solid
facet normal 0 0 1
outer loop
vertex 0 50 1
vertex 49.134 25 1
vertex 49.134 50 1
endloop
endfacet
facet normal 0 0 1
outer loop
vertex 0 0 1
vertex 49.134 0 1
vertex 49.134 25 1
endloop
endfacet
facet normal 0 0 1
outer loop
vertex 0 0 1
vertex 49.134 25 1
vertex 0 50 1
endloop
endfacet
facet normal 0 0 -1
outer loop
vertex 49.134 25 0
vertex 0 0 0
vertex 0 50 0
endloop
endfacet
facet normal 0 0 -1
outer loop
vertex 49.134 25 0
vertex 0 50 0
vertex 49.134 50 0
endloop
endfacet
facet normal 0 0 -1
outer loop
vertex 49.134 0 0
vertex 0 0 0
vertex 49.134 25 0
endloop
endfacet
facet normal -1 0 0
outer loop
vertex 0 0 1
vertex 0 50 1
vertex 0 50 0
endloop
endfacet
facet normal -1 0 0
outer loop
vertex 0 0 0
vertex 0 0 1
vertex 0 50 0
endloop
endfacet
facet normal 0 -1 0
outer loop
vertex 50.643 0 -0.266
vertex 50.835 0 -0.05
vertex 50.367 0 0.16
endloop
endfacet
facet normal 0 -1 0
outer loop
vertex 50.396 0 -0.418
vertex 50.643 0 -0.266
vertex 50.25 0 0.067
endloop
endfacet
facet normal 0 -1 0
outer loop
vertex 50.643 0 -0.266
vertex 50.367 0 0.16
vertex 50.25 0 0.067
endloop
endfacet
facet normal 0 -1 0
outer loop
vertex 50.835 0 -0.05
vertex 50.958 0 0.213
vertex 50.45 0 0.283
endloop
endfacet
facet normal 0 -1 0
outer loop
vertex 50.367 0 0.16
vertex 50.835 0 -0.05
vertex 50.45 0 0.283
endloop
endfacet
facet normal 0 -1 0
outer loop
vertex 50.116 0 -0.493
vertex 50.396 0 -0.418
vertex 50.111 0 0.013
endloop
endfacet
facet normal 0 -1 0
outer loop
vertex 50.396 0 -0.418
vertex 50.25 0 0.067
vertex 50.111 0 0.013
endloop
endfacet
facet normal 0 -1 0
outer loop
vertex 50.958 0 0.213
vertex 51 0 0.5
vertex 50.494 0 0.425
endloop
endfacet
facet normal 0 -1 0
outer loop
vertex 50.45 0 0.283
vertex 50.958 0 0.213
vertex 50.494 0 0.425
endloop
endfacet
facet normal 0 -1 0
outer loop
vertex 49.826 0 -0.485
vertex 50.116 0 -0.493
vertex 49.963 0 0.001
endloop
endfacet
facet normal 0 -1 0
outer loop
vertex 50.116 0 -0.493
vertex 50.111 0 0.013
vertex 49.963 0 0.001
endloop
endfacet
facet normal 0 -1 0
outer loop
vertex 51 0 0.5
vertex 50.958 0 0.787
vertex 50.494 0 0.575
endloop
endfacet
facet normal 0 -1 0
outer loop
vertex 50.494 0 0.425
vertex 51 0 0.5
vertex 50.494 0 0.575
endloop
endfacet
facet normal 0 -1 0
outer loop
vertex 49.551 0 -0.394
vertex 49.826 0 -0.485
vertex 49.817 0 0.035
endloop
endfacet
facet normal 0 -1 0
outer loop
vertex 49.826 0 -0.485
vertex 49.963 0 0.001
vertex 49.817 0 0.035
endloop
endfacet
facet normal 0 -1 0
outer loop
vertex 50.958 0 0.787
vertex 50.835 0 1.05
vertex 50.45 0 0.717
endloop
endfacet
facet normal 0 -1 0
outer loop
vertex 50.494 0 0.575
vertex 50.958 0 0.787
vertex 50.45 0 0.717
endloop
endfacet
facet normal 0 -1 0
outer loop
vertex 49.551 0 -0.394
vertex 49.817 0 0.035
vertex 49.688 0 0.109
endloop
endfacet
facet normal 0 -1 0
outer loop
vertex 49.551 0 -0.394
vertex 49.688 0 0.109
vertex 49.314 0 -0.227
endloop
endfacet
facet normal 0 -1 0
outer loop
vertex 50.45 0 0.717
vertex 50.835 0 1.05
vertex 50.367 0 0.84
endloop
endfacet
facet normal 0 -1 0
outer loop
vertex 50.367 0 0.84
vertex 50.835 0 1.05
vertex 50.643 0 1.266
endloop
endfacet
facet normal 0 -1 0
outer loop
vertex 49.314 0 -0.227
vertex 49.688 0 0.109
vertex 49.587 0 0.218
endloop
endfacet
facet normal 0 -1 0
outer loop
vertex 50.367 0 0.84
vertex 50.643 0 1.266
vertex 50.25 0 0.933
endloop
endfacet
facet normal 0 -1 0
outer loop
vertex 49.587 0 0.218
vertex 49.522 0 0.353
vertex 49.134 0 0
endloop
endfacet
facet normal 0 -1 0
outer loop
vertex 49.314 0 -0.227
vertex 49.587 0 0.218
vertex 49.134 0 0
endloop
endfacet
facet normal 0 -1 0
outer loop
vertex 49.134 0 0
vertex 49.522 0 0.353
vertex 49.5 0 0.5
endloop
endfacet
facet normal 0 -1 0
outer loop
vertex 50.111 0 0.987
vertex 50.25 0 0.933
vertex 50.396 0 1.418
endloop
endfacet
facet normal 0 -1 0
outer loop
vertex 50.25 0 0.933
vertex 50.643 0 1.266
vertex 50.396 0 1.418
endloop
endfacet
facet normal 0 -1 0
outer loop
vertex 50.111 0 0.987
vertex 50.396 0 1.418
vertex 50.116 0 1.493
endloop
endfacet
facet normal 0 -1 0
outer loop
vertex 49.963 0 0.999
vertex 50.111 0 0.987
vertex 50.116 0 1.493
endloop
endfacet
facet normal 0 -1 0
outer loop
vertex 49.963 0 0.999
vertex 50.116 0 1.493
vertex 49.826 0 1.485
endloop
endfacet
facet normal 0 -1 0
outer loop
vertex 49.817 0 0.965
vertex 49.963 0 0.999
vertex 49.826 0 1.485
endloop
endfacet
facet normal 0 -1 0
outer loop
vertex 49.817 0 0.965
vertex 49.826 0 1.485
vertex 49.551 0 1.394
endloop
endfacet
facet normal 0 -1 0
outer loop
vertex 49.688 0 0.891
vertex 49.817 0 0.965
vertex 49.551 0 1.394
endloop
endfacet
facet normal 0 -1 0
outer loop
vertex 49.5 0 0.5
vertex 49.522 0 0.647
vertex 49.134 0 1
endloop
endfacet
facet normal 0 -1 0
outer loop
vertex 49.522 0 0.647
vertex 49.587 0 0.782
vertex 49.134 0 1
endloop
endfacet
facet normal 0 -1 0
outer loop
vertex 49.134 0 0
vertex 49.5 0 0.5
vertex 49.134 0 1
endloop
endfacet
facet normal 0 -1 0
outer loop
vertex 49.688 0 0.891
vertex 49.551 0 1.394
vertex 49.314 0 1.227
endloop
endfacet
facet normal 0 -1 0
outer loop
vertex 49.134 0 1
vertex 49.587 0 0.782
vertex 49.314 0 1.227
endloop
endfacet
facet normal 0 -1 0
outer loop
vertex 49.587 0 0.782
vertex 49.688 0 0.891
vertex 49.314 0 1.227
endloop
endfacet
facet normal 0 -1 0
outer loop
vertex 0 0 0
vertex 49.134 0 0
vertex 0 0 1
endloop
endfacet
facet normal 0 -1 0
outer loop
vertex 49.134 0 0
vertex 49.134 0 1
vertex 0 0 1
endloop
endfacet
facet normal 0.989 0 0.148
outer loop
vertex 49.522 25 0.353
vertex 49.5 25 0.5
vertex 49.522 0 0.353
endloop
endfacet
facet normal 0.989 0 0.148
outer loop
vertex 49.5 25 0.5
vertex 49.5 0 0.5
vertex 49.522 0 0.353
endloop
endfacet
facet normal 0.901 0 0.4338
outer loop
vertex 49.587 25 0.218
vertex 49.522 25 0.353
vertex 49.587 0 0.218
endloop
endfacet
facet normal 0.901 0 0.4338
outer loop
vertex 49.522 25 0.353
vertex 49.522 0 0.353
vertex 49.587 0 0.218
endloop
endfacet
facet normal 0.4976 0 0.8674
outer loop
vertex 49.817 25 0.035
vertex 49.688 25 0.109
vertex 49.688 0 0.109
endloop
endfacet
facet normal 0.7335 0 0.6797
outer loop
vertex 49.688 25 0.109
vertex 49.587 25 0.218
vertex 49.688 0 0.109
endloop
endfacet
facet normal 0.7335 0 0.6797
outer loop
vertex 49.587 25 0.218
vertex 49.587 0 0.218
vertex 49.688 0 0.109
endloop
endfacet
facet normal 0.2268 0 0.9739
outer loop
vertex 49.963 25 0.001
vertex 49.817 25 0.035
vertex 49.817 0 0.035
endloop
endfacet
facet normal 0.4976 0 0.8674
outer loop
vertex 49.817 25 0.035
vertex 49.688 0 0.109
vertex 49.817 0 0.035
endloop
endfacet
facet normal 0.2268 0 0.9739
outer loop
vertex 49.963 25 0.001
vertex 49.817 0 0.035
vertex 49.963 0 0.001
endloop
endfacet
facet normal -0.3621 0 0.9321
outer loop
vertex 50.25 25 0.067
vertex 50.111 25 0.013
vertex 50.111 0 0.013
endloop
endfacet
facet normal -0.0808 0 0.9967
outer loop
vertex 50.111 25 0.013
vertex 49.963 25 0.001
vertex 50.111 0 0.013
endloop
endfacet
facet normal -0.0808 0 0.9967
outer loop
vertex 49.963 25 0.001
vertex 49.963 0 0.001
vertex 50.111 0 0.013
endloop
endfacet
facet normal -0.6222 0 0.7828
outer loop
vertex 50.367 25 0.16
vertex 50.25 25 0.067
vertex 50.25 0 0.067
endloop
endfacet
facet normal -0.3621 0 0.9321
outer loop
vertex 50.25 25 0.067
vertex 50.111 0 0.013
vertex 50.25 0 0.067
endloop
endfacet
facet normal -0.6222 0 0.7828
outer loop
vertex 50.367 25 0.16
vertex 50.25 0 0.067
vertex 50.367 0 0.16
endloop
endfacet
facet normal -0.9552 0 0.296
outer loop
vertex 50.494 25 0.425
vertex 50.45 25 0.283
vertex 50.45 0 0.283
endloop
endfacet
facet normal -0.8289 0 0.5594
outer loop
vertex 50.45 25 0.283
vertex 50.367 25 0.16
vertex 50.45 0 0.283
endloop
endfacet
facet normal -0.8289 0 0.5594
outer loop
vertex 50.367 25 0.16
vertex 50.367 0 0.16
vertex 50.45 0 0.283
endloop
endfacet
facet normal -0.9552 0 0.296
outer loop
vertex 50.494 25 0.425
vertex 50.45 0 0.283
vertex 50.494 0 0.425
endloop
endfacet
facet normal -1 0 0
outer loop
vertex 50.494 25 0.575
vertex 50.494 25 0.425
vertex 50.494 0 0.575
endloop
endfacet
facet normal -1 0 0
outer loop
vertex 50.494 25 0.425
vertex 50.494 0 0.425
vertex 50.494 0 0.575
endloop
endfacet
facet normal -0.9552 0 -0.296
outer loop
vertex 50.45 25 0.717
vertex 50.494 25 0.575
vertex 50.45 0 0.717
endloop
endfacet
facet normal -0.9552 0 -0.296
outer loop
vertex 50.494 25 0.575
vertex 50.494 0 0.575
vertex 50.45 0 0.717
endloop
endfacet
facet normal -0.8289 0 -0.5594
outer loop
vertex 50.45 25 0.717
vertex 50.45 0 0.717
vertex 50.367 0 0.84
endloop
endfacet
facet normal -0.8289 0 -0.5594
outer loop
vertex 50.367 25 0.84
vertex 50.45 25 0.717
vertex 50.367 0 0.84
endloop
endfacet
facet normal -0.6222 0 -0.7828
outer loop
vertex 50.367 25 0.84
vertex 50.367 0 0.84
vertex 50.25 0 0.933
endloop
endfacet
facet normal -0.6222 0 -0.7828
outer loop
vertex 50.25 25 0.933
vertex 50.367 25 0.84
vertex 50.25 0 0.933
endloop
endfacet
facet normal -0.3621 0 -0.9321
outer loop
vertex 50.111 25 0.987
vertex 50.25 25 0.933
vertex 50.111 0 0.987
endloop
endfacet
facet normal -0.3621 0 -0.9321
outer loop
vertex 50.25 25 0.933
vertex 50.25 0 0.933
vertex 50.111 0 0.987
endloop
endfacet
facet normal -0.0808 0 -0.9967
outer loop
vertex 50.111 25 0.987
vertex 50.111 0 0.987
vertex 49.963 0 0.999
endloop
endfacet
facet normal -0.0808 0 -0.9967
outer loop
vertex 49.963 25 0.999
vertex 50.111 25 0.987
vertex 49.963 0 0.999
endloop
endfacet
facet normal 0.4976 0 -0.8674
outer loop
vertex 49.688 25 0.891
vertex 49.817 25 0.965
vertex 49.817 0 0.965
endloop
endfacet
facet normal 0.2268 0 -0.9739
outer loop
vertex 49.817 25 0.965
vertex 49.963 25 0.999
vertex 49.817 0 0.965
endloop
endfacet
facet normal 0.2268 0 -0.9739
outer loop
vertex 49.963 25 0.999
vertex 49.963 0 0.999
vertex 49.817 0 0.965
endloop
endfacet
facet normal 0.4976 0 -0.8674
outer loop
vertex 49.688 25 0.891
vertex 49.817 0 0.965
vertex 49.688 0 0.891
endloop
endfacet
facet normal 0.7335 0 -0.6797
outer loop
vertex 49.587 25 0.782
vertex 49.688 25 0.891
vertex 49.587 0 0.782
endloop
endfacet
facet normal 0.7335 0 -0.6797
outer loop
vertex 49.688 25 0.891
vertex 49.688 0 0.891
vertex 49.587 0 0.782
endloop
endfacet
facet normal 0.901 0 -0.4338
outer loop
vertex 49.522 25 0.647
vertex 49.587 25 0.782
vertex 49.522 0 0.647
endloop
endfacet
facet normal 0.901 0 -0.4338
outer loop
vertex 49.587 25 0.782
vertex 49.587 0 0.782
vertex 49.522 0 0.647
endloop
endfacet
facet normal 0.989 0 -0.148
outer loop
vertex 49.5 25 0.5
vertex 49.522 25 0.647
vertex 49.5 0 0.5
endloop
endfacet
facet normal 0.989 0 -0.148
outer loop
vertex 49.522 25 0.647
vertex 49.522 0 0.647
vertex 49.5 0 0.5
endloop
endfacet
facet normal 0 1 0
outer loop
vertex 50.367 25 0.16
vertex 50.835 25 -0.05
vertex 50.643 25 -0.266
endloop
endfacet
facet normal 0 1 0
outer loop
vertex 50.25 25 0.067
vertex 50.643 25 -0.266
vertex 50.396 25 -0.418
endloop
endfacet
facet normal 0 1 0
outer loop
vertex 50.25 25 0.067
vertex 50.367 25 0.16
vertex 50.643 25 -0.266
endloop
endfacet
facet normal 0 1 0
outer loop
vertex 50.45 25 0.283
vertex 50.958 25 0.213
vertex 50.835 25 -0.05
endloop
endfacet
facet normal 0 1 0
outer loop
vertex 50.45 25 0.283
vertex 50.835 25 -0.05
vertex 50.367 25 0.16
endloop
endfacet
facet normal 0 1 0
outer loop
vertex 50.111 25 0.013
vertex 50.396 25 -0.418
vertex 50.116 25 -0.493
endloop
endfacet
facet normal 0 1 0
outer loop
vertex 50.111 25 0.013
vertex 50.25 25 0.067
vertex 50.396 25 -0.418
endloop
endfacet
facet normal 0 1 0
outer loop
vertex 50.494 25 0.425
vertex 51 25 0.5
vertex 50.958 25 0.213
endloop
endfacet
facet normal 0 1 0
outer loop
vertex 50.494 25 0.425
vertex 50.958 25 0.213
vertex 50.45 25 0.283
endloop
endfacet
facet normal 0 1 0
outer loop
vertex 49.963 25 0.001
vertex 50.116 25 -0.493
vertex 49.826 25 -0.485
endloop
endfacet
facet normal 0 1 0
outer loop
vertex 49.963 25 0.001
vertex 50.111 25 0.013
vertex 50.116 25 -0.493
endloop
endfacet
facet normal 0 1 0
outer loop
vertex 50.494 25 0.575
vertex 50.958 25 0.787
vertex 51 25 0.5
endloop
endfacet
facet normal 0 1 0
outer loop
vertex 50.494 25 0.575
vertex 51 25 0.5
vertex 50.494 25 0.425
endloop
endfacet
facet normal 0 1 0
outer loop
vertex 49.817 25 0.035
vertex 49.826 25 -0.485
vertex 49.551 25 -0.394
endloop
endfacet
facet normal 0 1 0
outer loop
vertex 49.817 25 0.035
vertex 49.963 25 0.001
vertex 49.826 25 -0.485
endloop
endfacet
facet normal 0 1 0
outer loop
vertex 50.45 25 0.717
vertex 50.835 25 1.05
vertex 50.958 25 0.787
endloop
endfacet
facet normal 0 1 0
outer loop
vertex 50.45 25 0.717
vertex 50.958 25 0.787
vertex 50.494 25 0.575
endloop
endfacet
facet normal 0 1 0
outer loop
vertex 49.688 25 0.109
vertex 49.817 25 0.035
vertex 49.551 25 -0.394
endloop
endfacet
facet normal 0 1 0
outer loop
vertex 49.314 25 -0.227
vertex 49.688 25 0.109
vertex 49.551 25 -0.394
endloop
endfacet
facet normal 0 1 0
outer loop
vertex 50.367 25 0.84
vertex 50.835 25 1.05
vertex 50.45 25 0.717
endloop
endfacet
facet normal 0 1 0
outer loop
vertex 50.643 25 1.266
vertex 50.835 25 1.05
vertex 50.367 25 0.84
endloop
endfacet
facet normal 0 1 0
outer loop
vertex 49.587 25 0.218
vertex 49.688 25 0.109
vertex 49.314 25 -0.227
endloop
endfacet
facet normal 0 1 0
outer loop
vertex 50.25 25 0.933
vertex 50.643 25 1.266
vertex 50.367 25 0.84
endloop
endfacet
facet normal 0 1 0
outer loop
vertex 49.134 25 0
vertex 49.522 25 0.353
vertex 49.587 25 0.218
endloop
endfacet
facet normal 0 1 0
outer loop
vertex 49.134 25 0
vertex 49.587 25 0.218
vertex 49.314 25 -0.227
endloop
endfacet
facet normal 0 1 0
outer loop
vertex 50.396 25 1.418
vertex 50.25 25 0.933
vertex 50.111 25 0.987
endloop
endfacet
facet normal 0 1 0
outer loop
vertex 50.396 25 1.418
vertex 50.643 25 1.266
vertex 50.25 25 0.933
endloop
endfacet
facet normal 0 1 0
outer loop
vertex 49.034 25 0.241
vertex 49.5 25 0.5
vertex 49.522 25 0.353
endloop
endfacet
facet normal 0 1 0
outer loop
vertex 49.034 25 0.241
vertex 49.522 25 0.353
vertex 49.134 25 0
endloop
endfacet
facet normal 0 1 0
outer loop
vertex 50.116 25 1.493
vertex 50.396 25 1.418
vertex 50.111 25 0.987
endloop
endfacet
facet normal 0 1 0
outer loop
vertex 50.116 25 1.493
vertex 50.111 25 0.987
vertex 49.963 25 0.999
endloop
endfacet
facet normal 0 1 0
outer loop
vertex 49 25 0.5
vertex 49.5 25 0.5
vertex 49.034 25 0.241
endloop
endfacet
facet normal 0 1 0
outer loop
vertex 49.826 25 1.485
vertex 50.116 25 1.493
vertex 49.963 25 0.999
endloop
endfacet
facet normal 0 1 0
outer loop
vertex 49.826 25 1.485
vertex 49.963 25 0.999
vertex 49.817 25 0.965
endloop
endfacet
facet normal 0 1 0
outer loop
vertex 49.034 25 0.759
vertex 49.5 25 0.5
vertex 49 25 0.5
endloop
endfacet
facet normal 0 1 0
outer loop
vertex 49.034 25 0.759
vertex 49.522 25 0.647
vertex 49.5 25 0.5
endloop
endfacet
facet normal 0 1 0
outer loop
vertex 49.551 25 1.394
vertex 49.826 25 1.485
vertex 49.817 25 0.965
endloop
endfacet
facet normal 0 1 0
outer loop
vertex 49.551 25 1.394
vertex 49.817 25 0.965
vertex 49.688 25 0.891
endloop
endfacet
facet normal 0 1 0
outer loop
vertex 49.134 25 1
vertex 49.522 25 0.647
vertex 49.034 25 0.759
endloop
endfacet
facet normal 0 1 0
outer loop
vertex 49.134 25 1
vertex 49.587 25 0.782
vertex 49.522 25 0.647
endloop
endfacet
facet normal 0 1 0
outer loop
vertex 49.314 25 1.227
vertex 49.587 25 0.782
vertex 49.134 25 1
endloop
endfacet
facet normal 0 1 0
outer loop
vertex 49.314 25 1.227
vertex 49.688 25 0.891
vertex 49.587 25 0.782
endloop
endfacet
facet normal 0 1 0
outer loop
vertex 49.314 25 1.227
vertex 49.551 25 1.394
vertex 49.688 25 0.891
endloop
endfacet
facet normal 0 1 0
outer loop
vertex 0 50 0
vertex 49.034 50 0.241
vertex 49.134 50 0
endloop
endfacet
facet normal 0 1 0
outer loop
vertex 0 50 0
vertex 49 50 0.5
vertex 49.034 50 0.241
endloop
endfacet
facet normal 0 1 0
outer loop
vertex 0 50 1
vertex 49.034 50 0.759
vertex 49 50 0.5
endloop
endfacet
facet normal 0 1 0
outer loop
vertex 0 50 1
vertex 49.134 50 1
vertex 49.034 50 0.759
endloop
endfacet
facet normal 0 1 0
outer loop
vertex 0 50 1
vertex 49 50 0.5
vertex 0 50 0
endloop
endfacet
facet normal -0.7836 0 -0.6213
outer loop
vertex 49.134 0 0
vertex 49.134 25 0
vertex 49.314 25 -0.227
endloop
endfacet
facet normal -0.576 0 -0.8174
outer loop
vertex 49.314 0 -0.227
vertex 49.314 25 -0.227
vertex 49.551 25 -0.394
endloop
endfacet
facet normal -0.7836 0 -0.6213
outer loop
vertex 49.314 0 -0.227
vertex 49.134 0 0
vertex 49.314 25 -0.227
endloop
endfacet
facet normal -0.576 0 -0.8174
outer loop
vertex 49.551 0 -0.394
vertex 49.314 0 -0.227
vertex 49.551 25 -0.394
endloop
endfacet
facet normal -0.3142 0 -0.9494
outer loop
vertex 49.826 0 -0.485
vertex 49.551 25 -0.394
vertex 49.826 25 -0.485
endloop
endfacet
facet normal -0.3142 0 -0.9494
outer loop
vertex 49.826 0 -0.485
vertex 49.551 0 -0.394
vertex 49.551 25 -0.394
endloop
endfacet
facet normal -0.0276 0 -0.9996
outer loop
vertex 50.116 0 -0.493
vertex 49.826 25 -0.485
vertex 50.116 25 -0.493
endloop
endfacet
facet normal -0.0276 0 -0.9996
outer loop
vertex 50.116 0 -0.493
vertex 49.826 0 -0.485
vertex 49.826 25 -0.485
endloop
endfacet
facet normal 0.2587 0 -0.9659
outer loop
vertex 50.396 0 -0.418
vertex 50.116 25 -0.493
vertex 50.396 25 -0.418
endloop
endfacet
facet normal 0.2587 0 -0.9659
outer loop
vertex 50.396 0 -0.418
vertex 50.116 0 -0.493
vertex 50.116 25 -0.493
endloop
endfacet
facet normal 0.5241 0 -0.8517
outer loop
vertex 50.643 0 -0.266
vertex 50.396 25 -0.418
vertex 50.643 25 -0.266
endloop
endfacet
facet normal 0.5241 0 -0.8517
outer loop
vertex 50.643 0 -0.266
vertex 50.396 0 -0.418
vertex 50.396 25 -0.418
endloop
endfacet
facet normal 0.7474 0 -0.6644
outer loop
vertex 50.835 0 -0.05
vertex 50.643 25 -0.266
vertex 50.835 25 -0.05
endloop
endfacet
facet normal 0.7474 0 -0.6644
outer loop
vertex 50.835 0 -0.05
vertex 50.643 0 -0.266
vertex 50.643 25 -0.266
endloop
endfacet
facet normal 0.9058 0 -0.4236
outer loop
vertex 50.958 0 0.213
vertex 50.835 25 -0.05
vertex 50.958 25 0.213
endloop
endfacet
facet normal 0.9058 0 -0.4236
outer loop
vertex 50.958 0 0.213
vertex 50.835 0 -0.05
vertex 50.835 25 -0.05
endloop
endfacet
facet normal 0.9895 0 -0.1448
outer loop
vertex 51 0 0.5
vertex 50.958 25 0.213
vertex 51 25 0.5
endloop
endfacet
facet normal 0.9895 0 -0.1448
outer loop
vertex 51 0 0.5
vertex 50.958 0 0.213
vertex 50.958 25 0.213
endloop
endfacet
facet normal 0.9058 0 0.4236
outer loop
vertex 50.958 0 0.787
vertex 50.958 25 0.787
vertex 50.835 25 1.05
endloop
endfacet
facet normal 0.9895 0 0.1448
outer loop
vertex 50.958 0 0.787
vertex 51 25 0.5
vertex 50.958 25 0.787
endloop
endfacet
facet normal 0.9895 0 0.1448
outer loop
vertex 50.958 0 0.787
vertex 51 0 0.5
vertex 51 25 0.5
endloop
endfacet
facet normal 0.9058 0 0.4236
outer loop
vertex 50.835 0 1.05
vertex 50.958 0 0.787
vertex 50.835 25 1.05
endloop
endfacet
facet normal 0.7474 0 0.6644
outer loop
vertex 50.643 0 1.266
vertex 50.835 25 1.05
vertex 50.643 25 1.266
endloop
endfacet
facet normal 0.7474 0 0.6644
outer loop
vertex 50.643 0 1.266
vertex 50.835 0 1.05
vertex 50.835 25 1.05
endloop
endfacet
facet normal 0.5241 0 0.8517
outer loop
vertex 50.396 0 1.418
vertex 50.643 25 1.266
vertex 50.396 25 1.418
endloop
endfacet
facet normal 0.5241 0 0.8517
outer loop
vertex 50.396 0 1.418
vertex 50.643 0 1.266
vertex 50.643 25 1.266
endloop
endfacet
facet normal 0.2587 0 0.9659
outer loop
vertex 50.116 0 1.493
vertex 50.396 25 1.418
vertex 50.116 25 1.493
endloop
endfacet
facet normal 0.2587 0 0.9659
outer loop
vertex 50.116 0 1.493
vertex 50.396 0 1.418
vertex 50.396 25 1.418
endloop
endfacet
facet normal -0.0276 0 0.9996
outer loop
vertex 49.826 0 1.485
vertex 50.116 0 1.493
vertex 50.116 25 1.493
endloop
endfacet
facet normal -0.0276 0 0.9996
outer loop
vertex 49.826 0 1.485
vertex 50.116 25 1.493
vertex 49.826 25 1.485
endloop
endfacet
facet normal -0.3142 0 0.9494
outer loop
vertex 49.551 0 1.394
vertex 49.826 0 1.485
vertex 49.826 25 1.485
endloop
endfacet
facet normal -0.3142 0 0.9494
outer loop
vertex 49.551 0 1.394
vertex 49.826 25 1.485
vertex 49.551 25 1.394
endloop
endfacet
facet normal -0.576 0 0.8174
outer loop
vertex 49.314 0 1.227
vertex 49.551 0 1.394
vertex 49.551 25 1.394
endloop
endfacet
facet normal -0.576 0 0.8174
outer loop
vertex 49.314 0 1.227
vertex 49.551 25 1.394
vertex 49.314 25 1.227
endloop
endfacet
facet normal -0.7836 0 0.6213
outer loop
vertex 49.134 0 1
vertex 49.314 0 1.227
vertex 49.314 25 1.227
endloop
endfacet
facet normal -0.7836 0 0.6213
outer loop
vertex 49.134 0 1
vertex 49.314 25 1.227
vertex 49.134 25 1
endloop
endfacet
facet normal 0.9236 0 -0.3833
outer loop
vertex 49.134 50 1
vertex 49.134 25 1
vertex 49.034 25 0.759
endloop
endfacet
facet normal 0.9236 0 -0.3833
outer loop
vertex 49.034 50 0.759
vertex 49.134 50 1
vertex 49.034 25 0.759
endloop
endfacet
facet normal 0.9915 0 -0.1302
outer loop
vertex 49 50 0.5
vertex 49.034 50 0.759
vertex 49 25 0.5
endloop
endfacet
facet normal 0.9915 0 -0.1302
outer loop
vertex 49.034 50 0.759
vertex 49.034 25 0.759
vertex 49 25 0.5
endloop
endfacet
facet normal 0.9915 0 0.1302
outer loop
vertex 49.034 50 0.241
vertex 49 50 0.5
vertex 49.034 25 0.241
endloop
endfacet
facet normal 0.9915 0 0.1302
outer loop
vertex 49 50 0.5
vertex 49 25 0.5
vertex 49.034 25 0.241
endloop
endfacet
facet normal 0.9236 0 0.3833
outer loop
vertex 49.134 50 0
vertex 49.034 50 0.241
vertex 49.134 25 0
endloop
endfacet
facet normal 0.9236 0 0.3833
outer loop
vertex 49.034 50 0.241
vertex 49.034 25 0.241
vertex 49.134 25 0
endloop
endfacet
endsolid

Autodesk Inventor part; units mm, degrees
ref_plane "YZ Plane" through (0, 0, 0) normal (1, 0, 0) x (0, 1, 0)
ref_plane "XZ Plane" through (0, 0, 0) normal (0, 1, 0) x (-1, 0, 0)
ref_plane "XY Plane" through (0, 0, 0) normal (0, 0, 1) x (1, 0, 0)
sketch "Szkic1" plane through (0, 0, 0) normal (0, 1, 0) x (-1, 0, 0)
  line L0 (0, 0) -> (-49.134, 0)
  line L1 (-49.134, 1) -> (0, 1)
  line L2 (0, 1) -> (0, 0)
  circle A0 centre (-50, 0.5) radius 1
  circle A1 centre (-50, 0.5) radius 0.5
  dimension "d2" = 2
  dimension "d3" = 1
  dimension "d4" = 49.134
  dimension "d9" = 1
extrude "Wyciągnięcie proste1" add sketch "Szkic1" along normal blind 50 contours L0 A0 L1 L2
extrude "Wyciągnięcie proste3" add sketch "Szkic1" along normal blind 25 contours A0
properties part number "zawias"
